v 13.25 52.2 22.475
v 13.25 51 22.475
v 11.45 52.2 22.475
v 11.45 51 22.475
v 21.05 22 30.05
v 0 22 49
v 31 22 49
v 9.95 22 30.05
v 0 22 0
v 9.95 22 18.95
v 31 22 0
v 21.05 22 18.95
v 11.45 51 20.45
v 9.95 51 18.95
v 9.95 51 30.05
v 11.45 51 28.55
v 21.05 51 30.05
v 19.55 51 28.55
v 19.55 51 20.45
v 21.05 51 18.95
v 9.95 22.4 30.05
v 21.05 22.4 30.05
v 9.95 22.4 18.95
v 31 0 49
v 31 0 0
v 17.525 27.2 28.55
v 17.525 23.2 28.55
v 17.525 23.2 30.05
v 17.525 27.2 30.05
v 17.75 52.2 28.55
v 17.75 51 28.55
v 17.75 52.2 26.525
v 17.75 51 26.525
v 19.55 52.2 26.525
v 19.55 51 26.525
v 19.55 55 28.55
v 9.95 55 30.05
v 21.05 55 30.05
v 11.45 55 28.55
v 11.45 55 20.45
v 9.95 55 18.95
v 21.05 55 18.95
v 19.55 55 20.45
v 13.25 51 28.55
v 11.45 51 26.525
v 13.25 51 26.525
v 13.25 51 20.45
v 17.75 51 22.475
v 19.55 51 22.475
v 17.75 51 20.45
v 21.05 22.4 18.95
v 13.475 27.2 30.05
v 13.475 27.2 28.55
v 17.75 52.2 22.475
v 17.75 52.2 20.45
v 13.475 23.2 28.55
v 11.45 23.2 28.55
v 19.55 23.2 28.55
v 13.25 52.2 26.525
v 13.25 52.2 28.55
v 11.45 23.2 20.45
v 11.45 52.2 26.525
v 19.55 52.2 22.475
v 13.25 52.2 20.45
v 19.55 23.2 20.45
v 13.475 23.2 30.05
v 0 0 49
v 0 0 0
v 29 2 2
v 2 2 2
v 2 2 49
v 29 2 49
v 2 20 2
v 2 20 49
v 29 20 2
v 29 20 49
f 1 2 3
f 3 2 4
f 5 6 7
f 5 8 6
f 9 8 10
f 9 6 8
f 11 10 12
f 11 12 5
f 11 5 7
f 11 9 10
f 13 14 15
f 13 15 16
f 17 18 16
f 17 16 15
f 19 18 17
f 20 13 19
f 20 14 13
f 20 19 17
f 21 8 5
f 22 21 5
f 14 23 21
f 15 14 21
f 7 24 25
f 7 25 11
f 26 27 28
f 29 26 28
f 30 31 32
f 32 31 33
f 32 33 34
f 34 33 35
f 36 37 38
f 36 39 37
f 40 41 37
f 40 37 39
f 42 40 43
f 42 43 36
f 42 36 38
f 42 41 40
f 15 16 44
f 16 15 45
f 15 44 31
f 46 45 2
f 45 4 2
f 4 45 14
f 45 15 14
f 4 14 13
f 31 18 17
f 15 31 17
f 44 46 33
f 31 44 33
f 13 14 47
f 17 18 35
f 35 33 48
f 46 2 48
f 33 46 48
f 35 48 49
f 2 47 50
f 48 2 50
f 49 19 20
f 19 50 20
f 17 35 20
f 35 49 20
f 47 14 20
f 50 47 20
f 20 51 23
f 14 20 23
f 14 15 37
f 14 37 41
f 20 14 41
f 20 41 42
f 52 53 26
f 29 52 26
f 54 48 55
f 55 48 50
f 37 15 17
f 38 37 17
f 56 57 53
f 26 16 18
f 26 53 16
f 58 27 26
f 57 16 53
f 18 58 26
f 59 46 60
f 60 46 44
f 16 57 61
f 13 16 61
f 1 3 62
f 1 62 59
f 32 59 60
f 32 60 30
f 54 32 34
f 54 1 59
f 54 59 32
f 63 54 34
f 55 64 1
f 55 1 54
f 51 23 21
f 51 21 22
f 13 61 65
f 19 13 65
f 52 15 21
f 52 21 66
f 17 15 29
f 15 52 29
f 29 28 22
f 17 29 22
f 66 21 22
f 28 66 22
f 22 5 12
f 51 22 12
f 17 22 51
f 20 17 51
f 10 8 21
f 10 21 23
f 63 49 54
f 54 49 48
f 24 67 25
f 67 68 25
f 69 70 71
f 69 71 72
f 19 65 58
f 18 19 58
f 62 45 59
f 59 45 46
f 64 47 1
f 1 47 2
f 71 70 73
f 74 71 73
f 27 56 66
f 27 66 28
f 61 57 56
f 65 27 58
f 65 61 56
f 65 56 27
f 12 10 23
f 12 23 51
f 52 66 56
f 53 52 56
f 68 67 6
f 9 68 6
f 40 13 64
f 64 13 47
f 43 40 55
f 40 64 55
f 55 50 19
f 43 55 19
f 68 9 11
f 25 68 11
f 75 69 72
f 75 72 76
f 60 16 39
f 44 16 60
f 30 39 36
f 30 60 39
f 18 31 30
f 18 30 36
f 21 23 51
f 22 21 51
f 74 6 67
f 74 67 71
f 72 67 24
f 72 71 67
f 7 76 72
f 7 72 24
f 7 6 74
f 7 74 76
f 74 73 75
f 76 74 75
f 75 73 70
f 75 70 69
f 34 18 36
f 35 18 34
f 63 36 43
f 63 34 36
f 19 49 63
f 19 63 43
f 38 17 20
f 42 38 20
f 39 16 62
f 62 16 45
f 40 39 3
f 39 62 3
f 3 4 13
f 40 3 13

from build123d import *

# Parameters (mm, degrees)
SKETCH1_W            = 31
SKETCH1_H            = 22
BOSS_EXTRUDE1_DEPTH  = 2
BOSS_EXTRUDE2_START  = 2
SKETCH1_3_W          = 31
SKETCH1_3_H          = 22
SKETCH1_3_W_2        = 27
SKETCH1_3_H_2        = 18
BOSS_EXTRUDE2_DEPTH  = 47
SKETCH2_W            = 11.1
SKETCH2_H            = 11.1
SKETCH2_W_2          = 8.1
SKETCH2_H_2          = 8.1
BOSS_EXTRUDE3_DEPTH  = 33
SKETCH2_7_W          = 11.1
SKETCH2_7_H          = 11.1
BOSS_EXTRUDE6_DEPTH  = 1.2
SKETCH3_W            = 4.05
SKETCH3_H            = 4
CUT_EXTRUDE1_DEPTH   = 1.5
BOSS_EXTRUDE4_START  = 30.2
BOSS_EXTRUDE4_DEPTH  = 1.2
SPLIT2_START         = 22.4
SPLIT2_OUTLINE_W     = 11.1
SPLIT2_OUTLINE_H     = 11.1
SPLIT2_DEPTH         = 32.6
SPLIT2_2_DEPTH       = 28.6
SPLIT2_START_2       = 27.2
SPLIT2_3_OUTLINE_W   = 4.05
SPLIT2_3_OUTLINE_H   = 1.5
SPLIT2_3_DEPTH       = 23.8
SPLIT2_4_DEPTH       = 0.8
SPLIT2_START_3       = 51
SPLIT2_5_OUTLINE_W   = 11.1
SPLIT2_5_OUTLINE_H   = 11.1
SPLIT2_5_OUTLINE_W_2 = 8.1
SPLIT2_5_OUTLINE_H_2 = 8.1
SPLIT2_5_DEPTH       = 4
SPLIT2_6_DEPTH       = 1.2


# Read off the part's stored shape, not the designer's step: Split2
with BuildPart() as part:
    # Sketch1 → Boss-Extrude1 (new body)
    with BuildSketch(Plane.XY):
        with Locations((15.5, 11)):
            Rectangle(SKETCH1_W, SKETCH1_H)
    extrude(amount=BOSS_EXTRUDE1_DEPTH)

    # Sketch1<3> → Boss-Extrude2 (add)
    with BuildSketch(Plane.XY.offset(BOSS_EXTRUDE2_START)):
        with Locations((15.5, 11)):
            Rectangle(SKETCH1_3_W, SKETCH1_3_H)
        with Locations((15.5, 11)):
            Rectangle(SKETCH1_3_W_2, SKETCH1_3_H_2, mode=Mode.SUBTRACT)
    extrude(amount=BOSS_EXTRUDE2_DEPTH)

    # Sketch2 → Boss-Extrude3 (add)
    with BuildSketch(Plane(origin=(0, 22, 0), x_dir=(1, 0, 0), z_dir=(0, 1, 0))):
        with Locations((15.5, -24.5)):
            Rectangle(SKETCH2_W, SKETCH2_H)
        with Locations((15.5, -24.5)):
            Rectangle(SKETCH2_W_2, SKETCH2_H_2, mode=Mode.SUBTRACT)
    extrude(amount=BOSS_EXTRUDE3_DEPTH)

    # Sketch2<7> → Boss-Extrude6 (add)
    with BuildSketch(Plane(origin=(0, 22, 0), x_dir=(1, 0, 0), z_dir=(0, 1, 0))):
        with Locations((15.5, -24.5)):
            Rectangle(SKETCH2_7_W, SKETCH2_7_H)
    extrude(amount=BOSS_EXTRUDE6_DEPTH)

    # Sketch3 → Cut-Extrude1 (cut)
    with BuildSketch(Plane.XY.offset(30.05)):
        with Locations((15.5, 25.2)):
            Rectangle(SKETCH3_W, SKETCH3_H)
    extrude(amount=-CUT_EXTRUDE1_DEPTH, mode=Mode.SUBTRACT)

    # Sketch2<5> → Boss-Extrude4 (add)
    with BuildSketch(Plane(origin=(0, 22, 0), x_dir=(1, 0, 0), z_dir=(0, 1, 0)).offset(BOSS_EXTRUDE4_START)):
        Polygon((13.25, -26.525), (13.25, -28.55), (17.75, -28.55), (17.75, -26.525), (19.55, -26.525), (19.55, -22.475), (17.75, -22.475), (17.75, -20.45), (13.25, -20.45), (13.25, -22.475), (11.45, -22.475), (11.45, -26.525), align=None)
    extrude(amount=-BOSS_EXTRUDE4_DEPTH)

    # Split2 outline → Split2 (cut)
    with BuildSketch(Plane(origin=(0, 0, 0), x_dir=(1, 0, 0), z_dir=(0, 1, 0)).offset(SPLIT2_START)):
        with Locations((15.5, -24.5)):
            Rectangle(SPLIT2_OUTLINE_W, SPLIT2_OUTLINE_H)
    extrude(amount=SPLIT2_DEPTH, mode=Mode.SUBTRACT)


with BuildPart() as body_2:
    # Split2 2 outline → Split2 2 (new body)
    with BuildSketch(Plane(origin=(0, 0, 0), x_dir=(1, 0, 0), z_dir=(0, 1, 0)).offset(SPLIT2_START)):
        Polygon((11.45, -20.45), (19.55, -20.45), (19.55, -28.55), (17.525, -28.55), (17.525, -30.05), (21.05, -30.05), (21.05, -18.95), (9.95, -18.95), (9.95, -30.05), (13.475, -30.05), (13.475, -28.55), (11.45, -28.55), align=None)
    extrude(amount=SPLIT2_2_DEPTH)

    # Split2 3 outline → Split2 3 (add)
    with BuildSketch(Plane(origin=(0, 0, 0), x_dir=(1, 0, 0), z_dir=(0, 1, 0)).offset(SPLIT2_START_2)):
        with Locations((15.5, -29.3)):
            Rectangle(SPLIT2_3_OUTLINE_W, SPLIT2_3_OUTLINE_H)
    extrude(amount=SPLIT2_3_DEPTH)

    # Split2 4 outline → Split2 4 (add)
    with BuildSketch(Plane(origin=(0, 0, 0), x_dir=(1, 0, 0), z_dir=(0, 1, 0)).offset(SPLIT2_START)):
        Polygon((19.55, -28.55), (19.55, -20.45), (11.45, -20.45), (11.45, -28.55), (13.475, -28.55), (13.475, -30.05), (17.525, -30.05), (17.525, -28.55), align=None)
    extrude(amount=SPLIT2_4_DEPTH)


with BuildPart() as body_3:
    # Split2 5 outline → Split2 5 (new body)
    with BuildSketch(Plane(origin=(0, 0, 0), x_dir=(1, 0, 0), z_dir=(0, 1, 0)).offset(SPLIT2_START_3)):
        with Locations((15.5, -24.5)):
            Rectangle(SPLIT2_5_OUTLINE_W, SPLIT2_5_OUTLINE_H)
        with Locations((15.5, -24.5)):
            Rectangle(SPLIT2_5_OUTLINE_W_2, SPLIT2_5_OUTLINE_H_2, mode=Mode.SUBTRACT)
    extrude(amount=SPLIT2_5_DEPTH)

    # Split2 6 outline → Split2 6 (add)
    with BuildSketch(Plane(origin=(0, 0, 0), x_dir=(1, 0, 0), z_dir=(0, 1, 0)).offset(SPLIT2_START_3)):
        Polygon((13.25, -22.475), (11.45, -22.475), (11.45, -26.525), (13.25, -26.525), (13.25, -28.55), (17.75, -28.55), (17.75, -26.525), (19.55, -26.525), (19.55, -22.475), (17.75, -22.475), (17.75, -20.45), (13.25, -20.45), align=None)
    extrude(amount=SPLIT2_6_DEPTH)


solid = Compound([part.part, body_2.part, body_3.part])
